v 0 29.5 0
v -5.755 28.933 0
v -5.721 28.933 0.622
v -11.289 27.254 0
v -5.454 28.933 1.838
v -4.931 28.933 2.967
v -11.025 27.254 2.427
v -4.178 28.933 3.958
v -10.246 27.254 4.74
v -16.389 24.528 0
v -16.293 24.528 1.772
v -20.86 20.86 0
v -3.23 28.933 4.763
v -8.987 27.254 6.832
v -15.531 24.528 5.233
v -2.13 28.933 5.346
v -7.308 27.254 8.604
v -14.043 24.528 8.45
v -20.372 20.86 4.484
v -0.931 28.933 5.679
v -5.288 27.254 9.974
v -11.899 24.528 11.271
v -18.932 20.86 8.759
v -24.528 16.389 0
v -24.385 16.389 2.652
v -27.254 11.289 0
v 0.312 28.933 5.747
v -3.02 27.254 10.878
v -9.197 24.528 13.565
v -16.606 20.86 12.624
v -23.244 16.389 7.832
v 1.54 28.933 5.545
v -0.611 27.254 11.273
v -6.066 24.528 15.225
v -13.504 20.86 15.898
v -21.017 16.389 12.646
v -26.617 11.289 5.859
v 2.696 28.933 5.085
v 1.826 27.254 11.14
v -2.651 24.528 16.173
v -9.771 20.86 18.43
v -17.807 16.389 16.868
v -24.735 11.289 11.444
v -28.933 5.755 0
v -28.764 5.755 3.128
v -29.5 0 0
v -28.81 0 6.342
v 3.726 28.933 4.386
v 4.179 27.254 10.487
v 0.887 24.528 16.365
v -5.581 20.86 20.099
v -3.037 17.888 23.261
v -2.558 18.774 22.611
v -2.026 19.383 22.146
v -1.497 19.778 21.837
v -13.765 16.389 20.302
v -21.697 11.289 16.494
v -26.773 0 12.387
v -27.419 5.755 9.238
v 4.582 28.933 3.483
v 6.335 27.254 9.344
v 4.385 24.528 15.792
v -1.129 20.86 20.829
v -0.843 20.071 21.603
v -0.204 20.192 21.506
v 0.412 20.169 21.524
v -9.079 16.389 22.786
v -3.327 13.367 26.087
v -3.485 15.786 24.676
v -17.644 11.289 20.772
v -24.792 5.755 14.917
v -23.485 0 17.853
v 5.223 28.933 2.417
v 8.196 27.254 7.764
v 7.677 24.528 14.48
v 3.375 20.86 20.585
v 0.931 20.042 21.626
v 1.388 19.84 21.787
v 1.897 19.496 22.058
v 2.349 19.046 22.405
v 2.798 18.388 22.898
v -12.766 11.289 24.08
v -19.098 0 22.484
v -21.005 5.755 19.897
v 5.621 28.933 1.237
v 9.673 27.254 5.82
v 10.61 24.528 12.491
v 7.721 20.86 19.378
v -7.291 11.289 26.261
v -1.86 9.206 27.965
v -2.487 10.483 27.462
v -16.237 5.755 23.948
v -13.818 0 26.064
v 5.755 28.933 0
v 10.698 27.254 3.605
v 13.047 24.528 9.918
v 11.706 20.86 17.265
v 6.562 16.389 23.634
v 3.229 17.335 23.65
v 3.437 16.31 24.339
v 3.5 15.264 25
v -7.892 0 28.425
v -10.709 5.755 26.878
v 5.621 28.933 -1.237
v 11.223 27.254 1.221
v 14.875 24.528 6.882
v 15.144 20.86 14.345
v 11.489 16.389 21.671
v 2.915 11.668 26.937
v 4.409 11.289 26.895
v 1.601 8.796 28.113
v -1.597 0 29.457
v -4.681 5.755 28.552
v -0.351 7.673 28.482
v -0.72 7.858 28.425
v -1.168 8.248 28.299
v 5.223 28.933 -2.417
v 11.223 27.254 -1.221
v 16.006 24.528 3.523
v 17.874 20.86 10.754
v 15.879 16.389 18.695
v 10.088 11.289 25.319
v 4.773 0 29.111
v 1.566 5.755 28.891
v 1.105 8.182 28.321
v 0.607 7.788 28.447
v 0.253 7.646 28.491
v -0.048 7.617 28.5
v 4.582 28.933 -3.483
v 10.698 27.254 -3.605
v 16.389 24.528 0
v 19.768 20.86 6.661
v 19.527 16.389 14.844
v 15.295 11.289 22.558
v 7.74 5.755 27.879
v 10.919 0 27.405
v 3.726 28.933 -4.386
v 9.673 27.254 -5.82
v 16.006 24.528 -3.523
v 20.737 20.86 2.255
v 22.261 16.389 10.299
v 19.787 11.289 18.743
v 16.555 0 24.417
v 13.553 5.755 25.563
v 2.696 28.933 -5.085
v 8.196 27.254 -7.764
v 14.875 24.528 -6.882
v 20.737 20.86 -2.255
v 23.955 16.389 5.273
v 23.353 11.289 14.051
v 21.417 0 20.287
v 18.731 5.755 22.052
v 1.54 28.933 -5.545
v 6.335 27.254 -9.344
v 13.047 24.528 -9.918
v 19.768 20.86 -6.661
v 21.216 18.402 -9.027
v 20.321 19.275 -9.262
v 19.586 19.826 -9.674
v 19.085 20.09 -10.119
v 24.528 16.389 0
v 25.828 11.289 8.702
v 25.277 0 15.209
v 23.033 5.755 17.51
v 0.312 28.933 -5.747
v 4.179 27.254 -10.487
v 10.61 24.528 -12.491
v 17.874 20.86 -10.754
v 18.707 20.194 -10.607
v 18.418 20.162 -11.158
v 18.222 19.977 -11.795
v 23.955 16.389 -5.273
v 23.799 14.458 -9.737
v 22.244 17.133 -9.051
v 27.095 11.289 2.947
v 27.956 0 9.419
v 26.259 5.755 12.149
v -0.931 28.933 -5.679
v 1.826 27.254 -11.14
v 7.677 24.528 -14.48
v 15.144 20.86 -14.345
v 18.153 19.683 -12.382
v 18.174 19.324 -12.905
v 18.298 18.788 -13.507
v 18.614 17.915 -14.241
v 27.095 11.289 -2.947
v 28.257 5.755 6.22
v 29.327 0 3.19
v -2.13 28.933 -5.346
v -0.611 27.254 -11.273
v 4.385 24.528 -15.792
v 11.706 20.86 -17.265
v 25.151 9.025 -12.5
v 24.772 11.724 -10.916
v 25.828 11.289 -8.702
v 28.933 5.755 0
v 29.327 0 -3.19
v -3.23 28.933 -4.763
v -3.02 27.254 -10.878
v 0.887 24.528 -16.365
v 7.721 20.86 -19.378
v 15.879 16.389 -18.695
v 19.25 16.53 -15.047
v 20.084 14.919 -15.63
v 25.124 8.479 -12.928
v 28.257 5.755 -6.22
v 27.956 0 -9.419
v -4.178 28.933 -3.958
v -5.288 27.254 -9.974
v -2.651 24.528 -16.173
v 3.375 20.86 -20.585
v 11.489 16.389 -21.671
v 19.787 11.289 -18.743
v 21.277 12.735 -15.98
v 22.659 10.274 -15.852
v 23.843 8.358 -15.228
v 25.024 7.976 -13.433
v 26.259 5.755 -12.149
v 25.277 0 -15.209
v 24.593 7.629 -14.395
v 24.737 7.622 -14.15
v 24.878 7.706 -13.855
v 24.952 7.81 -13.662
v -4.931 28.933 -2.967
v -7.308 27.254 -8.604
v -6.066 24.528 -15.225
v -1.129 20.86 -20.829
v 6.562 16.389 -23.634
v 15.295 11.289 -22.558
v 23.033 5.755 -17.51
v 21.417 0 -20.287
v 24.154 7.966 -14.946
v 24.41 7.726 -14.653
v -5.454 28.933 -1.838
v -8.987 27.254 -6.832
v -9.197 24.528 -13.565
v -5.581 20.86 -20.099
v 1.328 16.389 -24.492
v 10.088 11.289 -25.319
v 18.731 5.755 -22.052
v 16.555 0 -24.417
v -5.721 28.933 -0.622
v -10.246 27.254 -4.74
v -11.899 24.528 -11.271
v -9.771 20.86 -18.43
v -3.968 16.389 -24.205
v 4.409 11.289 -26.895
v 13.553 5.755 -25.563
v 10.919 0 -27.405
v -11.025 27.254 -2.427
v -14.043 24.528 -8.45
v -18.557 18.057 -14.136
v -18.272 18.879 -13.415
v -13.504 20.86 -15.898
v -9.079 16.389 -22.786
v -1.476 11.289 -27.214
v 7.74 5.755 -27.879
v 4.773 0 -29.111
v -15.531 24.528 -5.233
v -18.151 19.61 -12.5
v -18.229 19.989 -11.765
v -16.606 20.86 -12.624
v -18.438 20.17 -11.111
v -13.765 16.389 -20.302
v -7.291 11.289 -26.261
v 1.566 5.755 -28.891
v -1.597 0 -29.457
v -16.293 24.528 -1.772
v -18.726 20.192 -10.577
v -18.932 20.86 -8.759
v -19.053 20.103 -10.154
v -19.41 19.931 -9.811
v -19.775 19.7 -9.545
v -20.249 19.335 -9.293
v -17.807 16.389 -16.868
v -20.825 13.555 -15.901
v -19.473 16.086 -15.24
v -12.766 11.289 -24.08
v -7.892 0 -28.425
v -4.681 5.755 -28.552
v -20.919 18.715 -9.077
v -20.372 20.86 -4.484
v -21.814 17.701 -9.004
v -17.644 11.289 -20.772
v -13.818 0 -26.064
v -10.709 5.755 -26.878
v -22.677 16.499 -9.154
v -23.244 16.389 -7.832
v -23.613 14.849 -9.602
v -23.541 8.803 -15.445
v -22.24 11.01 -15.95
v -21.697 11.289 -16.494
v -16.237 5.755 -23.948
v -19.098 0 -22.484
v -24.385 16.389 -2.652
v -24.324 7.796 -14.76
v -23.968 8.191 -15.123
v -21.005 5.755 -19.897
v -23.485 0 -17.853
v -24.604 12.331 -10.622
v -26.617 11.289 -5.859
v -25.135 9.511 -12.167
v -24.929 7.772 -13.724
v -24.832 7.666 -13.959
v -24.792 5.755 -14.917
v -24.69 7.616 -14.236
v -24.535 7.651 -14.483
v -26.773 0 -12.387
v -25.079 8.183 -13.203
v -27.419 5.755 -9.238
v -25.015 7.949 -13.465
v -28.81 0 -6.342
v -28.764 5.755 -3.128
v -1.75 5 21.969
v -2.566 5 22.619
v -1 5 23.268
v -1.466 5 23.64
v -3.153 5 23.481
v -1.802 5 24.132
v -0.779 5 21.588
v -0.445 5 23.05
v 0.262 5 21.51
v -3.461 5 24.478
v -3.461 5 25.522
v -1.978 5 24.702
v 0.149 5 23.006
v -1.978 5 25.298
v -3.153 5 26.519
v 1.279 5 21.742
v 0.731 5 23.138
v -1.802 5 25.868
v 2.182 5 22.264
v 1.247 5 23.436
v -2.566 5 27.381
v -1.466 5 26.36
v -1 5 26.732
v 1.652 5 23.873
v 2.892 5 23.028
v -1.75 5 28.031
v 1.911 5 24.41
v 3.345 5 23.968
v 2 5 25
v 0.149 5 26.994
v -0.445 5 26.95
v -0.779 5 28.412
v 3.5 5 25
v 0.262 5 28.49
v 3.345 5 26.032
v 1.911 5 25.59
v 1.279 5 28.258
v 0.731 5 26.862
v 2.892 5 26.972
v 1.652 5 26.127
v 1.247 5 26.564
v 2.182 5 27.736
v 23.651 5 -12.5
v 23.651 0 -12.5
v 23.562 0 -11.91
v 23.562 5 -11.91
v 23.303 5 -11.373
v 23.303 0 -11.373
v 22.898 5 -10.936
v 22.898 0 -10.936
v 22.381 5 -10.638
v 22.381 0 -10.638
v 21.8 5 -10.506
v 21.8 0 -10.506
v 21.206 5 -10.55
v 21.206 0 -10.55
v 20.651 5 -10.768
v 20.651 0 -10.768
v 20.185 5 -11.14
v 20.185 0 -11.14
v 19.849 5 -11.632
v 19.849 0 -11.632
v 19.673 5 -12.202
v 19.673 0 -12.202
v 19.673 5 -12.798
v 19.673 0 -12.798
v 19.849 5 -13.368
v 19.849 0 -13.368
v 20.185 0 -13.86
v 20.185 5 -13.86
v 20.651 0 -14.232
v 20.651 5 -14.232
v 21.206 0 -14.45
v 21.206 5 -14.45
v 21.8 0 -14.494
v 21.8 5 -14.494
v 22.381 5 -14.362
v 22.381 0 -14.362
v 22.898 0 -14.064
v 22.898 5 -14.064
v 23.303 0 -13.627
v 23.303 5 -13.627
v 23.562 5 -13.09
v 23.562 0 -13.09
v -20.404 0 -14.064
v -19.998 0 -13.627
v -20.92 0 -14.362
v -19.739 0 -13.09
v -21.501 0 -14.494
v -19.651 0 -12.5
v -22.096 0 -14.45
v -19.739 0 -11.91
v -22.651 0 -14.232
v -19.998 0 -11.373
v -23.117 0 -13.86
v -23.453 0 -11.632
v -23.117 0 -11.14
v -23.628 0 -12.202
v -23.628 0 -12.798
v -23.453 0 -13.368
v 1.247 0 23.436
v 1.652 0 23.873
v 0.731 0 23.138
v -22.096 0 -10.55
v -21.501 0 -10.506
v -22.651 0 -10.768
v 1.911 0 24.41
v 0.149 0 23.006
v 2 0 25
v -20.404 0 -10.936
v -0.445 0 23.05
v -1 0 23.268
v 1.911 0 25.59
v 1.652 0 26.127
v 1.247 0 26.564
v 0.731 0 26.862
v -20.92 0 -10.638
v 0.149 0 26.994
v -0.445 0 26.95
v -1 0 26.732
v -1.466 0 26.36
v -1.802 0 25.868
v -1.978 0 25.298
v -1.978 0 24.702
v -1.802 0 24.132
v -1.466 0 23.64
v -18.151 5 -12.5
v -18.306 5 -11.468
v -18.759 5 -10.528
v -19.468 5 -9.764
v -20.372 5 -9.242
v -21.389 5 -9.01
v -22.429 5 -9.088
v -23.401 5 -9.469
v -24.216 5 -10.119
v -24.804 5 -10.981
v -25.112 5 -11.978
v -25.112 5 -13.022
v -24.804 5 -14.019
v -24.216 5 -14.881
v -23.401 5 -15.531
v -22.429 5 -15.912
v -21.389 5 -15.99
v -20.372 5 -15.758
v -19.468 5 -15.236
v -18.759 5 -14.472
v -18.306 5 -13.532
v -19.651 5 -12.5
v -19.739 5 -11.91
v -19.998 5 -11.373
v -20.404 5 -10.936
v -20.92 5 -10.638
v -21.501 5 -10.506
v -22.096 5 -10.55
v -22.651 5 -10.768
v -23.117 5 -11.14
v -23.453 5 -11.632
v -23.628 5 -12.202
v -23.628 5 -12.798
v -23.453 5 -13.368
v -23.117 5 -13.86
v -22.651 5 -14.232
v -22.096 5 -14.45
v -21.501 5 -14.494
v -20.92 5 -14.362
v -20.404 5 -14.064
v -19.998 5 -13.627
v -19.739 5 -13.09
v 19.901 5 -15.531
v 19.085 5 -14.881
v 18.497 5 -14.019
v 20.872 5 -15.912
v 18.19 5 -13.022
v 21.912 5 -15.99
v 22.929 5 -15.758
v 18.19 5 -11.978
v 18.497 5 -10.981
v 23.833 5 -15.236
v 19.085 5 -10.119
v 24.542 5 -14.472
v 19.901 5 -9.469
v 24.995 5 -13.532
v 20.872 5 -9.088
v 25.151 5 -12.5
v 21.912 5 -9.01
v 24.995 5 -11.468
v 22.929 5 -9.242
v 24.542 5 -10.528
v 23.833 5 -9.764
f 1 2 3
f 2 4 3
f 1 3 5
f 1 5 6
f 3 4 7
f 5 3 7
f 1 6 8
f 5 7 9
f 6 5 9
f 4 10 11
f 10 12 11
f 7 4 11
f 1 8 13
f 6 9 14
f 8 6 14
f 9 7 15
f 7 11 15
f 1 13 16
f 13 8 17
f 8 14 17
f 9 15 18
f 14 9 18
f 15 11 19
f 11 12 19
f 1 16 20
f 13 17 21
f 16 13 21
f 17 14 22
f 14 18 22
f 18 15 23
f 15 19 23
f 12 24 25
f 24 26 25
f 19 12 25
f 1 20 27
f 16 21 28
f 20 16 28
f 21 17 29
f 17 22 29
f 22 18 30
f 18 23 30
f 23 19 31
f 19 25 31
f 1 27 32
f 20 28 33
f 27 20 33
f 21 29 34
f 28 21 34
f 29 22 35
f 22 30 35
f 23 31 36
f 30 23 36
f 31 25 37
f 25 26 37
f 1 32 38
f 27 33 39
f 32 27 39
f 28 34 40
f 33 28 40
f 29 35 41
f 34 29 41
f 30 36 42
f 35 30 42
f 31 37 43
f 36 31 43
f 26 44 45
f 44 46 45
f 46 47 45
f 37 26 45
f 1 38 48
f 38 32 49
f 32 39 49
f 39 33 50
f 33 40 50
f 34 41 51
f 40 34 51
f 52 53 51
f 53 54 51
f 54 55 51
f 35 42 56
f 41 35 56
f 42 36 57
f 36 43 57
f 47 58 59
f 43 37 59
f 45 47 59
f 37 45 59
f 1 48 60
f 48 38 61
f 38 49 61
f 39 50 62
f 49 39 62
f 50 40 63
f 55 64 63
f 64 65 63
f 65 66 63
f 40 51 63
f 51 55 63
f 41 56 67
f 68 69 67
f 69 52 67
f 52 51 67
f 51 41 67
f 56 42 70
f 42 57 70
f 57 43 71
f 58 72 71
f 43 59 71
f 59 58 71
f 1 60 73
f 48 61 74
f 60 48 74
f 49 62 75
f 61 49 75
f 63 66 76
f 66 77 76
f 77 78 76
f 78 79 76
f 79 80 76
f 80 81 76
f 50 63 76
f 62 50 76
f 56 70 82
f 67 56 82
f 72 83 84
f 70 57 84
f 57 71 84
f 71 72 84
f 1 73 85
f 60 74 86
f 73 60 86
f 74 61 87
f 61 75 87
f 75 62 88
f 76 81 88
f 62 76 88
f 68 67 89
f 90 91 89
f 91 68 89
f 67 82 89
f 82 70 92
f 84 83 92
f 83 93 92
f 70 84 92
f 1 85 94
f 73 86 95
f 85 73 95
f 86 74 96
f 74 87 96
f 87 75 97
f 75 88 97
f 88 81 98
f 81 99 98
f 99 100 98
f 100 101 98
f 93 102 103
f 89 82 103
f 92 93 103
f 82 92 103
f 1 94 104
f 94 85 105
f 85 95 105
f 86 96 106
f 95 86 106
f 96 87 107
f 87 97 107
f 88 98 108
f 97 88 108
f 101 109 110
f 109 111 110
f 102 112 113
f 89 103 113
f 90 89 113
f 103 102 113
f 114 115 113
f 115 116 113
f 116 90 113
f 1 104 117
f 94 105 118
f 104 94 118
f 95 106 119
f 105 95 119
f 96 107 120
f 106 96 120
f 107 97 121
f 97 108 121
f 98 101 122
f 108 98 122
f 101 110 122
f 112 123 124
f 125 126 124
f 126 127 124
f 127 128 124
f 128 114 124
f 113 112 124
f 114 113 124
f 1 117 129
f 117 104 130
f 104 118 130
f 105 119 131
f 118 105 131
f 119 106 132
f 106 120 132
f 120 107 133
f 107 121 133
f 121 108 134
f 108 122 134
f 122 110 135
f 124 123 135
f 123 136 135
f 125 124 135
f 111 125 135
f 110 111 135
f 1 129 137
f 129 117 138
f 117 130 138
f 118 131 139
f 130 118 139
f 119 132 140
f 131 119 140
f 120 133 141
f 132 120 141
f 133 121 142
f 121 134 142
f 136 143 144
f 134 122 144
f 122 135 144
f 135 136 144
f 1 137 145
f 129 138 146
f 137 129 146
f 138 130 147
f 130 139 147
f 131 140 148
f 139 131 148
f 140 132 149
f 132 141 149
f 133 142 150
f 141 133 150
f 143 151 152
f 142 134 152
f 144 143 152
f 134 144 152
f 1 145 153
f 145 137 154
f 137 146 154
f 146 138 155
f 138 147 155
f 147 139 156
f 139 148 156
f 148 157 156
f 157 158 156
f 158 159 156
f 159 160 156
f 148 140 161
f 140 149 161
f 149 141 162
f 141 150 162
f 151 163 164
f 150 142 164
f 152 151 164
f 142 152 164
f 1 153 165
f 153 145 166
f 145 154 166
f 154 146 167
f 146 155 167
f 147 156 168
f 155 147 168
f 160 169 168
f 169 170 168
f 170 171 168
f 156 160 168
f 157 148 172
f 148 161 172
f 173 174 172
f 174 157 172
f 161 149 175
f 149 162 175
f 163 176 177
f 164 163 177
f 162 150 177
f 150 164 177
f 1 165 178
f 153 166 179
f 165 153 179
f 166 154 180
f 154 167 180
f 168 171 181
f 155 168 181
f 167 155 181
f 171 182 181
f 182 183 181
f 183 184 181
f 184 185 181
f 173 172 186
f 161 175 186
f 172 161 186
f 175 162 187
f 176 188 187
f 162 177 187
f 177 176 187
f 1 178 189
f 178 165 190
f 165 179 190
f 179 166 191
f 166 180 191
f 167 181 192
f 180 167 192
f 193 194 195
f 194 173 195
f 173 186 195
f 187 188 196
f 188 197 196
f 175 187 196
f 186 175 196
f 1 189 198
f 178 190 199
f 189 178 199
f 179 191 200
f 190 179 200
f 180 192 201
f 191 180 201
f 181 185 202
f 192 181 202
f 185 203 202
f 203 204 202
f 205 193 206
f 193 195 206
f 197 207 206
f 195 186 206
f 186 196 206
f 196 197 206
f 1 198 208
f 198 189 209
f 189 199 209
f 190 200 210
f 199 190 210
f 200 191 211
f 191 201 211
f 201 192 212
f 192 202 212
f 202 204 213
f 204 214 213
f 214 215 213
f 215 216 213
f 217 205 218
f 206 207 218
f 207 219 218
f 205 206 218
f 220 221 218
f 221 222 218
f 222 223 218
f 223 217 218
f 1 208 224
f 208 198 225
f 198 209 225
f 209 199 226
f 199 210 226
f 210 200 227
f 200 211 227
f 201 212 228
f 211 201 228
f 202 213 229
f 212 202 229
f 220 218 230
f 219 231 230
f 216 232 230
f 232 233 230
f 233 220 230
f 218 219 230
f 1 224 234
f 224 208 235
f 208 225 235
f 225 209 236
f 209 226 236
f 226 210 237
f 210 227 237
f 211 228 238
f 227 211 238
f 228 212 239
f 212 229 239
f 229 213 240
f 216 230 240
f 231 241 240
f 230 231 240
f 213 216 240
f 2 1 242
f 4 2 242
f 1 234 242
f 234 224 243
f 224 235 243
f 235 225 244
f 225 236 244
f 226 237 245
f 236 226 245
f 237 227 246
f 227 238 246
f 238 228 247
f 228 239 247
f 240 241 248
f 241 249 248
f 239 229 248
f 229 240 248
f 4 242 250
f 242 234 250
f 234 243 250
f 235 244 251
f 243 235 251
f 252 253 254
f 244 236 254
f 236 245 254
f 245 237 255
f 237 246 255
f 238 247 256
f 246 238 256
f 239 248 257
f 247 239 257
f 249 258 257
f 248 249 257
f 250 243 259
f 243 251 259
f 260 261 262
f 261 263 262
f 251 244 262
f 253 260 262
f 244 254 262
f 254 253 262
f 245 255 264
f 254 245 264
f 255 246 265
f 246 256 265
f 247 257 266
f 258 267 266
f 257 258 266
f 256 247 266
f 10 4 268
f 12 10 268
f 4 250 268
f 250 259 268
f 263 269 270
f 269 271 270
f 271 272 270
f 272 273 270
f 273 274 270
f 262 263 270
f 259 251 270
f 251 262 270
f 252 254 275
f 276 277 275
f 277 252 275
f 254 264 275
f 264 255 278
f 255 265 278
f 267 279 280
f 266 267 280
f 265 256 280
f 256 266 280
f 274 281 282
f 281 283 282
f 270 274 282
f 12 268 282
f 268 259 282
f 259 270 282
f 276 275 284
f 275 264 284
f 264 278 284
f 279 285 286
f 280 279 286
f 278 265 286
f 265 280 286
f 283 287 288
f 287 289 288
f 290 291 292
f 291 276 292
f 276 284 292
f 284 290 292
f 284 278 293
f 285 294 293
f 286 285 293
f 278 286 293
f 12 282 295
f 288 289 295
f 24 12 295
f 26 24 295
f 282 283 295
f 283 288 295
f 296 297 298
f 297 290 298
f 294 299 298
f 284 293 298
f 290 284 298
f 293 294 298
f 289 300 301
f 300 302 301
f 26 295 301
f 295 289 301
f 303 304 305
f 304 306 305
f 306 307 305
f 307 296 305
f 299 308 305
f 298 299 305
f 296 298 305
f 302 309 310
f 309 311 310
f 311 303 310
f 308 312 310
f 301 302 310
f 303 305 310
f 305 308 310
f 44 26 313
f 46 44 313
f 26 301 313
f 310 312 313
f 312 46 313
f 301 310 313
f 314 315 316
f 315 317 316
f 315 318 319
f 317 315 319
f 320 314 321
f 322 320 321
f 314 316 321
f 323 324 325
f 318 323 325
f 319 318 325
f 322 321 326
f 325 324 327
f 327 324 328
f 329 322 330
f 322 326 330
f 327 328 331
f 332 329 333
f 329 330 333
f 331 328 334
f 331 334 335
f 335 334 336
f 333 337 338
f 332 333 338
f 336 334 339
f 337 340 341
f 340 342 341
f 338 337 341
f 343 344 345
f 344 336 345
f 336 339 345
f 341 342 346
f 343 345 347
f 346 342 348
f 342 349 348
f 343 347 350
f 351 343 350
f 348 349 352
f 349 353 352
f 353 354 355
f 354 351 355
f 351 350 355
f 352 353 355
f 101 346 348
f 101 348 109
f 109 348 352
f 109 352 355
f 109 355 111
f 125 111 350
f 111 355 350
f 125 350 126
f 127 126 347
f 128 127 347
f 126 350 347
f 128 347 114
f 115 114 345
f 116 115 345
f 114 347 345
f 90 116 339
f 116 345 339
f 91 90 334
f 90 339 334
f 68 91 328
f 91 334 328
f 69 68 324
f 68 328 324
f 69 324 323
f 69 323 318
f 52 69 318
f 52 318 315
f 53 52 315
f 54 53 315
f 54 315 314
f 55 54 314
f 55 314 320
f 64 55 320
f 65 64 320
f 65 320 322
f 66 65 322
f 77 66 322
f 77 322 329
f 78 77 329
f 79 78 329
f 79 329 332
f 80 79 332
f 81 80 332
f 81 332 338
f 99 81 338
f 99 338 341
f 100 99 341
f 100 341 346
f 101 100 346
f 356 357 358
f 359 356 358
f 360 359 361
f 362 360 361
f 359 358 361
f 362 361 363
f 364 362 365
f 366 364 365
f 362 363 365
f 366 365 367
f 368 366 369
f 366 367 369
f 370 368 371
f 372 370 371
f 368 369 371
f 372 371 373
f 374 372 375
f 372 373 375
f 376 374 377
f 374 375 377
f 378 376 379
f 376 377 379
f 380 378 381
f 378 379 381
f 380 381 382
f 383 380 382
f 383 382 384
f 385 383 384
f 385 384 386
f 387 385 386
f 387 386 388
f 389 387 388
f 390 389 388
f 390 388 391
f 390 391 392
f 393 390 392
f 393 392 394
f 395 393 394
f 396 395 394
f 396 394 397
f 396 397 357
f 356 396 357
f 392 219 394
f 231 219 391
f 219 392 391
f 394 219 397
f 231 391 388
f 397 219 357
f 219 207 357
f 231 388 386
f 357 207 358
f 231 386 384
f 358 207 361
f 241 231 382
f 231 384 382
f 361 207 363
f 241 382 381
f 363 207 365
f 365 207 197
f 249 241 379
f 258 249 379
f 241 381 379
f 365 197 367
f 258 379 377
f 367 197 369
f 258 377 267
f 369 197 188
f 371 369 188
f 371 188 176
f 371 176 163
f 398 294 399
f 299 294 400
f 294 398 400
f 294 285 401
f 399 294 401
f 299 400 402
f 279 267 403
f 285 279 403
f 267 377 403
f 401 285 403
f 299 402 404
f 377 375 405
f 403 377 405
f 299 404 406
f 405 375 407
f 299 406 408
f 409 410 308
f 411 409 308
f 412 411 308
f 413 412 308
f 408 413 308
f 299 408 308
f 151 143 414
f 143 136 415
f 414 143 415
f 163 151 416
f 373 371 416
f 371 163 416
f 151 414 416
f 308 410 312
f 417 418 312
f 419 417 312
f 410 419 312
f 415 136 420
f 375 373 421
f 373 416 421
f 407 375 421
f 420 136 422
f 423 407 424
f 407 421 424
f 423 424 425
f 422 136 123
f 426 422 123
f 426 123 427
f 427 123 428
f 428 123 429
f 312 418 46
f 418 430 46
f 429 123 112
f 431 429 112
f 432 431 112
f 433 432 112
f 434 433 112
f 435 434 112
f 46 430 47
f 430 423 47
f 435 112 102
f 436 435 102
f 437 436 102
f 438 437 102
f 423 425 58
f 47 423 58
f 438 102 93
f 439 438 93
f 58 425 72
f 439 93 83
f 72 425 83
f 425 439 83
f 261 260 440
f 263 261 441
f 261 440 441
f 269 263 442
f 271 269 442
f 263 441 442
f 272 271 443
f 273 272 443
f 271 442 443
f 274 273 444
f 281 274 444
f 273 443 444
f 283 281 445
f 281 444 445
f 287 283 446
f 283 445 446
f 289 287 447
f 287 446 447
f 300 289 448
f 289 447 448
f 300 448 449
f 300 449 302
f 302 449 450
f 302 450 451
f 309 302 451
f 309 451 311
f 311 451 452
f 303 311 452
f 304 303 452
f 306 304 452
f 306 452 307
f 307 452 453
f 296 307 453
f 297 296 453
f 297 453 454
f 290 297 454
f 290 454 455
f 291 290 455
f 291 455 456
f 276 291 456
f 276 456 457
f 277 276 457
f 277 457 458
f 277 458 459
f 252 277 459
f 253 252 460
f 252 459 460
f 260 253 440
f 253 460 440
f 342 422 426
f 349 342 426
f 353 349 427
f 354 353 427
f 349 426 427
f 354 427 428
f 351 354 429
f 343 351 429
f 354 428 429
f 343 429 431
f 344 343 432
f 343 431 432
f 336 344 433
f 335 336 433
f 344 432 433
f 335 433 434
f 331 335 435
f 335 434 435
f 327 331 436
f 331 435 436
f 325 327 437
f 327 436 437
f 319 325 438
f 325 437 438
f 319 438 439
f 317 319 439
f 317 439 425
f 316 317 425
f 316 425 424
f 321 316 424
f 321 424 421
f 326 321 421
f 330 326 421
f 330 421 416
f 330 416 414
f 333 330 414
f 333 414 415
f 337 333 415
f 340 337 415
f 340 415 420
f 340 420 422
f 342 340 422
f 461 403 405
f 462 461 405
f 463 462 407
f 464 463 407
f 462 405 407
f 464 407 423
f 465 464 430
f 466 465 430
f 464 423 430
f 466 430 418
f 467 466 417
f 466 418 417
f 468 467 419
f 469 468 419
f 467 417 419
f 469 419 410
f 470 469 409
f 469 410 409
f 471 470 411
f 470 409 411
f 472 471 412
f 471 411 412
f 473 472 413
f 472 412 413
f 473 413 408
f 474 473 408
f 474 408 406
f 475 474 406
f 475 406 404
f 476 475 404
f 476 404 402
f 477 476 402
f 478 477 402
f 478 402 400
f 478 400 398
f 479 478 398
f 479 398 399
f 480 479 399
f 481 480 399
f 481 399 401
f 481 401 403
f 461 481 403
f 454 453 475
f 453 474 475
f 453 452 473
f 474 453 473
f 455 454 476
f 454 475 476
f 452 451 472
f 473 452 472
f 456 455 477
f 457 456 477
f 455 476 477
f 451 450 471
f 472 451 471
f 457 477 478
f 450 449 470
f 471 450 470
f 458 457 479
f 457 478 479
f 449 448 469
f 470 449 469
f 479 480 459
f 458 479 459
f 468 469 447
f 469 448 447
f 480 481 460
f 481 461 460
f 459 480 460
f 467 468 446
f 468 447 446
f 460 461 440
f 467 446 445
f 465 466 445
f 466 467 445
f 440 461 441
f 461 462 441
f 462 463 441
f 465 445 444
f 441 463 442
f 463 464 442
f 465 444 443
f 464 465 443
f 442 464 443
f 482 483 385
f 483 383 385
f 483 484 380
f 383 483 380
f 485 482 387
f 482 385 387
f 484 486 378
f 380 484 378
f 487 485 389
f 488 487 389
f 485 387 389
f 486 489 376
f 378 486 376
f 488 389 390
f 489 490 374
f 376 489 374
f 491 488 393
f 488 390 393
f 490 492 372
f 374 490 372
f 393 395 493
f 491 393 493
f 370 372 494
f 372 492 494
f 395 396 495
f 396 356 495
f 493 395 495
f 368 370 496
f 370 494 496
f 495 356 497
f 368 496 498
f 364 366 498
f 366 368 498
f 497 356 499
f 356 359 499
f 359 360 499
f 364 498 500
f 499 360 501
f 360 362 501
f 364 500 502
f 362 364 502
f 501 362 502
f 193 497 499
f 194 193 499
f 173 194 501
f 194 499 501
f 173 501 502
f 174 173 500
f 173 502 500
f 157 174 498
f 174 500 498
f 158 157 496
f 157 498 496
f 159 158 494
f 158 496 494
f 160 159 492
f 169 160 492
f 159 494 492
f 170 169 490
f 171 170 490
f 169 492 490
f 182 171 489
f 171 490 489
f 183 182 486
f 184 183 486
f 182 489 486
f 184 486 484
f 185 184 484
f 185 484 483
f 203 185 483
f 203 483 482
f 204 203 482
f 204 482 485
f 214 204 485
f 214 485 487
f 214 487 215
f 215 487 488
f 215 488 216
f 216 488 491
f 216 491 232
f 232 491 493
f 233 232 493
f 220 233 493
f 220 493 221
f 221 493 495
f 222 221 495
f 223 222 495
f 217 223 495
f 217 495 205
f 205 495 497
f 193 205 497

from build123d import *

# Parameters (mm, degrees)
CUT_EXTRUDE_START   = -5
SKETCH_2_R          = 3.5
CUT_EXTRUDE_6_DEPTH = 40
SKETCH_2_9_R        = 2
CUT_EXTRUDE_7_DEPTH = 40


with BuildPart() as part:
    # 스케치1 → 회전1 (revolve)
    with BuildSketch(Plane.XY):
        with BuildLine():
            ThreePointArc((0, 29.5), (-20.859650045, 20.859650045), (-29.5, 0))
            Line((-29.5, 0), (0, 0))
            Line((0, 0), (0, 29.5))
        make_face()
    revolve(axis=Axis((0, 0, 0), (0, 1, 0)))

    # 스케치2 → 컷-돌출6 (cut)
    with BuildSketch(Plane.XZ.offset(CUT_EXTRUDE_START)):
        with Locations((0, 25)):
            Circle(SKETCH_2_R)
        with Locations((21.650635095, -12.5)):
            Circle(SKETCH_2_R)
        with Locations((-21.650635095, -12.5)):
            Circle(SKETCH_2_R)
    extrude(amount=-CUT_EXTRUDE_6_DEPTH, mode=Mode.SUBTRACT)

    # 스케치2<9> → 컷-돌출7 (cut)
    with BuildSketch(Plane.XZ):
        with Locations((0, 25)):
            Circle(SKETCH_2_9_R)
        with Locations((21.650635095, -12.5)):
            Circle(SKETCH_2_9_R)
        with Locations((-21.650635095, -12.5)):
            Circle(SKETCH_2_9_R)
    extrude(amount=-CUT_EXTRUDE_7_DEPTH, mode=Mode.SUBTRACT)


solid = part.part
